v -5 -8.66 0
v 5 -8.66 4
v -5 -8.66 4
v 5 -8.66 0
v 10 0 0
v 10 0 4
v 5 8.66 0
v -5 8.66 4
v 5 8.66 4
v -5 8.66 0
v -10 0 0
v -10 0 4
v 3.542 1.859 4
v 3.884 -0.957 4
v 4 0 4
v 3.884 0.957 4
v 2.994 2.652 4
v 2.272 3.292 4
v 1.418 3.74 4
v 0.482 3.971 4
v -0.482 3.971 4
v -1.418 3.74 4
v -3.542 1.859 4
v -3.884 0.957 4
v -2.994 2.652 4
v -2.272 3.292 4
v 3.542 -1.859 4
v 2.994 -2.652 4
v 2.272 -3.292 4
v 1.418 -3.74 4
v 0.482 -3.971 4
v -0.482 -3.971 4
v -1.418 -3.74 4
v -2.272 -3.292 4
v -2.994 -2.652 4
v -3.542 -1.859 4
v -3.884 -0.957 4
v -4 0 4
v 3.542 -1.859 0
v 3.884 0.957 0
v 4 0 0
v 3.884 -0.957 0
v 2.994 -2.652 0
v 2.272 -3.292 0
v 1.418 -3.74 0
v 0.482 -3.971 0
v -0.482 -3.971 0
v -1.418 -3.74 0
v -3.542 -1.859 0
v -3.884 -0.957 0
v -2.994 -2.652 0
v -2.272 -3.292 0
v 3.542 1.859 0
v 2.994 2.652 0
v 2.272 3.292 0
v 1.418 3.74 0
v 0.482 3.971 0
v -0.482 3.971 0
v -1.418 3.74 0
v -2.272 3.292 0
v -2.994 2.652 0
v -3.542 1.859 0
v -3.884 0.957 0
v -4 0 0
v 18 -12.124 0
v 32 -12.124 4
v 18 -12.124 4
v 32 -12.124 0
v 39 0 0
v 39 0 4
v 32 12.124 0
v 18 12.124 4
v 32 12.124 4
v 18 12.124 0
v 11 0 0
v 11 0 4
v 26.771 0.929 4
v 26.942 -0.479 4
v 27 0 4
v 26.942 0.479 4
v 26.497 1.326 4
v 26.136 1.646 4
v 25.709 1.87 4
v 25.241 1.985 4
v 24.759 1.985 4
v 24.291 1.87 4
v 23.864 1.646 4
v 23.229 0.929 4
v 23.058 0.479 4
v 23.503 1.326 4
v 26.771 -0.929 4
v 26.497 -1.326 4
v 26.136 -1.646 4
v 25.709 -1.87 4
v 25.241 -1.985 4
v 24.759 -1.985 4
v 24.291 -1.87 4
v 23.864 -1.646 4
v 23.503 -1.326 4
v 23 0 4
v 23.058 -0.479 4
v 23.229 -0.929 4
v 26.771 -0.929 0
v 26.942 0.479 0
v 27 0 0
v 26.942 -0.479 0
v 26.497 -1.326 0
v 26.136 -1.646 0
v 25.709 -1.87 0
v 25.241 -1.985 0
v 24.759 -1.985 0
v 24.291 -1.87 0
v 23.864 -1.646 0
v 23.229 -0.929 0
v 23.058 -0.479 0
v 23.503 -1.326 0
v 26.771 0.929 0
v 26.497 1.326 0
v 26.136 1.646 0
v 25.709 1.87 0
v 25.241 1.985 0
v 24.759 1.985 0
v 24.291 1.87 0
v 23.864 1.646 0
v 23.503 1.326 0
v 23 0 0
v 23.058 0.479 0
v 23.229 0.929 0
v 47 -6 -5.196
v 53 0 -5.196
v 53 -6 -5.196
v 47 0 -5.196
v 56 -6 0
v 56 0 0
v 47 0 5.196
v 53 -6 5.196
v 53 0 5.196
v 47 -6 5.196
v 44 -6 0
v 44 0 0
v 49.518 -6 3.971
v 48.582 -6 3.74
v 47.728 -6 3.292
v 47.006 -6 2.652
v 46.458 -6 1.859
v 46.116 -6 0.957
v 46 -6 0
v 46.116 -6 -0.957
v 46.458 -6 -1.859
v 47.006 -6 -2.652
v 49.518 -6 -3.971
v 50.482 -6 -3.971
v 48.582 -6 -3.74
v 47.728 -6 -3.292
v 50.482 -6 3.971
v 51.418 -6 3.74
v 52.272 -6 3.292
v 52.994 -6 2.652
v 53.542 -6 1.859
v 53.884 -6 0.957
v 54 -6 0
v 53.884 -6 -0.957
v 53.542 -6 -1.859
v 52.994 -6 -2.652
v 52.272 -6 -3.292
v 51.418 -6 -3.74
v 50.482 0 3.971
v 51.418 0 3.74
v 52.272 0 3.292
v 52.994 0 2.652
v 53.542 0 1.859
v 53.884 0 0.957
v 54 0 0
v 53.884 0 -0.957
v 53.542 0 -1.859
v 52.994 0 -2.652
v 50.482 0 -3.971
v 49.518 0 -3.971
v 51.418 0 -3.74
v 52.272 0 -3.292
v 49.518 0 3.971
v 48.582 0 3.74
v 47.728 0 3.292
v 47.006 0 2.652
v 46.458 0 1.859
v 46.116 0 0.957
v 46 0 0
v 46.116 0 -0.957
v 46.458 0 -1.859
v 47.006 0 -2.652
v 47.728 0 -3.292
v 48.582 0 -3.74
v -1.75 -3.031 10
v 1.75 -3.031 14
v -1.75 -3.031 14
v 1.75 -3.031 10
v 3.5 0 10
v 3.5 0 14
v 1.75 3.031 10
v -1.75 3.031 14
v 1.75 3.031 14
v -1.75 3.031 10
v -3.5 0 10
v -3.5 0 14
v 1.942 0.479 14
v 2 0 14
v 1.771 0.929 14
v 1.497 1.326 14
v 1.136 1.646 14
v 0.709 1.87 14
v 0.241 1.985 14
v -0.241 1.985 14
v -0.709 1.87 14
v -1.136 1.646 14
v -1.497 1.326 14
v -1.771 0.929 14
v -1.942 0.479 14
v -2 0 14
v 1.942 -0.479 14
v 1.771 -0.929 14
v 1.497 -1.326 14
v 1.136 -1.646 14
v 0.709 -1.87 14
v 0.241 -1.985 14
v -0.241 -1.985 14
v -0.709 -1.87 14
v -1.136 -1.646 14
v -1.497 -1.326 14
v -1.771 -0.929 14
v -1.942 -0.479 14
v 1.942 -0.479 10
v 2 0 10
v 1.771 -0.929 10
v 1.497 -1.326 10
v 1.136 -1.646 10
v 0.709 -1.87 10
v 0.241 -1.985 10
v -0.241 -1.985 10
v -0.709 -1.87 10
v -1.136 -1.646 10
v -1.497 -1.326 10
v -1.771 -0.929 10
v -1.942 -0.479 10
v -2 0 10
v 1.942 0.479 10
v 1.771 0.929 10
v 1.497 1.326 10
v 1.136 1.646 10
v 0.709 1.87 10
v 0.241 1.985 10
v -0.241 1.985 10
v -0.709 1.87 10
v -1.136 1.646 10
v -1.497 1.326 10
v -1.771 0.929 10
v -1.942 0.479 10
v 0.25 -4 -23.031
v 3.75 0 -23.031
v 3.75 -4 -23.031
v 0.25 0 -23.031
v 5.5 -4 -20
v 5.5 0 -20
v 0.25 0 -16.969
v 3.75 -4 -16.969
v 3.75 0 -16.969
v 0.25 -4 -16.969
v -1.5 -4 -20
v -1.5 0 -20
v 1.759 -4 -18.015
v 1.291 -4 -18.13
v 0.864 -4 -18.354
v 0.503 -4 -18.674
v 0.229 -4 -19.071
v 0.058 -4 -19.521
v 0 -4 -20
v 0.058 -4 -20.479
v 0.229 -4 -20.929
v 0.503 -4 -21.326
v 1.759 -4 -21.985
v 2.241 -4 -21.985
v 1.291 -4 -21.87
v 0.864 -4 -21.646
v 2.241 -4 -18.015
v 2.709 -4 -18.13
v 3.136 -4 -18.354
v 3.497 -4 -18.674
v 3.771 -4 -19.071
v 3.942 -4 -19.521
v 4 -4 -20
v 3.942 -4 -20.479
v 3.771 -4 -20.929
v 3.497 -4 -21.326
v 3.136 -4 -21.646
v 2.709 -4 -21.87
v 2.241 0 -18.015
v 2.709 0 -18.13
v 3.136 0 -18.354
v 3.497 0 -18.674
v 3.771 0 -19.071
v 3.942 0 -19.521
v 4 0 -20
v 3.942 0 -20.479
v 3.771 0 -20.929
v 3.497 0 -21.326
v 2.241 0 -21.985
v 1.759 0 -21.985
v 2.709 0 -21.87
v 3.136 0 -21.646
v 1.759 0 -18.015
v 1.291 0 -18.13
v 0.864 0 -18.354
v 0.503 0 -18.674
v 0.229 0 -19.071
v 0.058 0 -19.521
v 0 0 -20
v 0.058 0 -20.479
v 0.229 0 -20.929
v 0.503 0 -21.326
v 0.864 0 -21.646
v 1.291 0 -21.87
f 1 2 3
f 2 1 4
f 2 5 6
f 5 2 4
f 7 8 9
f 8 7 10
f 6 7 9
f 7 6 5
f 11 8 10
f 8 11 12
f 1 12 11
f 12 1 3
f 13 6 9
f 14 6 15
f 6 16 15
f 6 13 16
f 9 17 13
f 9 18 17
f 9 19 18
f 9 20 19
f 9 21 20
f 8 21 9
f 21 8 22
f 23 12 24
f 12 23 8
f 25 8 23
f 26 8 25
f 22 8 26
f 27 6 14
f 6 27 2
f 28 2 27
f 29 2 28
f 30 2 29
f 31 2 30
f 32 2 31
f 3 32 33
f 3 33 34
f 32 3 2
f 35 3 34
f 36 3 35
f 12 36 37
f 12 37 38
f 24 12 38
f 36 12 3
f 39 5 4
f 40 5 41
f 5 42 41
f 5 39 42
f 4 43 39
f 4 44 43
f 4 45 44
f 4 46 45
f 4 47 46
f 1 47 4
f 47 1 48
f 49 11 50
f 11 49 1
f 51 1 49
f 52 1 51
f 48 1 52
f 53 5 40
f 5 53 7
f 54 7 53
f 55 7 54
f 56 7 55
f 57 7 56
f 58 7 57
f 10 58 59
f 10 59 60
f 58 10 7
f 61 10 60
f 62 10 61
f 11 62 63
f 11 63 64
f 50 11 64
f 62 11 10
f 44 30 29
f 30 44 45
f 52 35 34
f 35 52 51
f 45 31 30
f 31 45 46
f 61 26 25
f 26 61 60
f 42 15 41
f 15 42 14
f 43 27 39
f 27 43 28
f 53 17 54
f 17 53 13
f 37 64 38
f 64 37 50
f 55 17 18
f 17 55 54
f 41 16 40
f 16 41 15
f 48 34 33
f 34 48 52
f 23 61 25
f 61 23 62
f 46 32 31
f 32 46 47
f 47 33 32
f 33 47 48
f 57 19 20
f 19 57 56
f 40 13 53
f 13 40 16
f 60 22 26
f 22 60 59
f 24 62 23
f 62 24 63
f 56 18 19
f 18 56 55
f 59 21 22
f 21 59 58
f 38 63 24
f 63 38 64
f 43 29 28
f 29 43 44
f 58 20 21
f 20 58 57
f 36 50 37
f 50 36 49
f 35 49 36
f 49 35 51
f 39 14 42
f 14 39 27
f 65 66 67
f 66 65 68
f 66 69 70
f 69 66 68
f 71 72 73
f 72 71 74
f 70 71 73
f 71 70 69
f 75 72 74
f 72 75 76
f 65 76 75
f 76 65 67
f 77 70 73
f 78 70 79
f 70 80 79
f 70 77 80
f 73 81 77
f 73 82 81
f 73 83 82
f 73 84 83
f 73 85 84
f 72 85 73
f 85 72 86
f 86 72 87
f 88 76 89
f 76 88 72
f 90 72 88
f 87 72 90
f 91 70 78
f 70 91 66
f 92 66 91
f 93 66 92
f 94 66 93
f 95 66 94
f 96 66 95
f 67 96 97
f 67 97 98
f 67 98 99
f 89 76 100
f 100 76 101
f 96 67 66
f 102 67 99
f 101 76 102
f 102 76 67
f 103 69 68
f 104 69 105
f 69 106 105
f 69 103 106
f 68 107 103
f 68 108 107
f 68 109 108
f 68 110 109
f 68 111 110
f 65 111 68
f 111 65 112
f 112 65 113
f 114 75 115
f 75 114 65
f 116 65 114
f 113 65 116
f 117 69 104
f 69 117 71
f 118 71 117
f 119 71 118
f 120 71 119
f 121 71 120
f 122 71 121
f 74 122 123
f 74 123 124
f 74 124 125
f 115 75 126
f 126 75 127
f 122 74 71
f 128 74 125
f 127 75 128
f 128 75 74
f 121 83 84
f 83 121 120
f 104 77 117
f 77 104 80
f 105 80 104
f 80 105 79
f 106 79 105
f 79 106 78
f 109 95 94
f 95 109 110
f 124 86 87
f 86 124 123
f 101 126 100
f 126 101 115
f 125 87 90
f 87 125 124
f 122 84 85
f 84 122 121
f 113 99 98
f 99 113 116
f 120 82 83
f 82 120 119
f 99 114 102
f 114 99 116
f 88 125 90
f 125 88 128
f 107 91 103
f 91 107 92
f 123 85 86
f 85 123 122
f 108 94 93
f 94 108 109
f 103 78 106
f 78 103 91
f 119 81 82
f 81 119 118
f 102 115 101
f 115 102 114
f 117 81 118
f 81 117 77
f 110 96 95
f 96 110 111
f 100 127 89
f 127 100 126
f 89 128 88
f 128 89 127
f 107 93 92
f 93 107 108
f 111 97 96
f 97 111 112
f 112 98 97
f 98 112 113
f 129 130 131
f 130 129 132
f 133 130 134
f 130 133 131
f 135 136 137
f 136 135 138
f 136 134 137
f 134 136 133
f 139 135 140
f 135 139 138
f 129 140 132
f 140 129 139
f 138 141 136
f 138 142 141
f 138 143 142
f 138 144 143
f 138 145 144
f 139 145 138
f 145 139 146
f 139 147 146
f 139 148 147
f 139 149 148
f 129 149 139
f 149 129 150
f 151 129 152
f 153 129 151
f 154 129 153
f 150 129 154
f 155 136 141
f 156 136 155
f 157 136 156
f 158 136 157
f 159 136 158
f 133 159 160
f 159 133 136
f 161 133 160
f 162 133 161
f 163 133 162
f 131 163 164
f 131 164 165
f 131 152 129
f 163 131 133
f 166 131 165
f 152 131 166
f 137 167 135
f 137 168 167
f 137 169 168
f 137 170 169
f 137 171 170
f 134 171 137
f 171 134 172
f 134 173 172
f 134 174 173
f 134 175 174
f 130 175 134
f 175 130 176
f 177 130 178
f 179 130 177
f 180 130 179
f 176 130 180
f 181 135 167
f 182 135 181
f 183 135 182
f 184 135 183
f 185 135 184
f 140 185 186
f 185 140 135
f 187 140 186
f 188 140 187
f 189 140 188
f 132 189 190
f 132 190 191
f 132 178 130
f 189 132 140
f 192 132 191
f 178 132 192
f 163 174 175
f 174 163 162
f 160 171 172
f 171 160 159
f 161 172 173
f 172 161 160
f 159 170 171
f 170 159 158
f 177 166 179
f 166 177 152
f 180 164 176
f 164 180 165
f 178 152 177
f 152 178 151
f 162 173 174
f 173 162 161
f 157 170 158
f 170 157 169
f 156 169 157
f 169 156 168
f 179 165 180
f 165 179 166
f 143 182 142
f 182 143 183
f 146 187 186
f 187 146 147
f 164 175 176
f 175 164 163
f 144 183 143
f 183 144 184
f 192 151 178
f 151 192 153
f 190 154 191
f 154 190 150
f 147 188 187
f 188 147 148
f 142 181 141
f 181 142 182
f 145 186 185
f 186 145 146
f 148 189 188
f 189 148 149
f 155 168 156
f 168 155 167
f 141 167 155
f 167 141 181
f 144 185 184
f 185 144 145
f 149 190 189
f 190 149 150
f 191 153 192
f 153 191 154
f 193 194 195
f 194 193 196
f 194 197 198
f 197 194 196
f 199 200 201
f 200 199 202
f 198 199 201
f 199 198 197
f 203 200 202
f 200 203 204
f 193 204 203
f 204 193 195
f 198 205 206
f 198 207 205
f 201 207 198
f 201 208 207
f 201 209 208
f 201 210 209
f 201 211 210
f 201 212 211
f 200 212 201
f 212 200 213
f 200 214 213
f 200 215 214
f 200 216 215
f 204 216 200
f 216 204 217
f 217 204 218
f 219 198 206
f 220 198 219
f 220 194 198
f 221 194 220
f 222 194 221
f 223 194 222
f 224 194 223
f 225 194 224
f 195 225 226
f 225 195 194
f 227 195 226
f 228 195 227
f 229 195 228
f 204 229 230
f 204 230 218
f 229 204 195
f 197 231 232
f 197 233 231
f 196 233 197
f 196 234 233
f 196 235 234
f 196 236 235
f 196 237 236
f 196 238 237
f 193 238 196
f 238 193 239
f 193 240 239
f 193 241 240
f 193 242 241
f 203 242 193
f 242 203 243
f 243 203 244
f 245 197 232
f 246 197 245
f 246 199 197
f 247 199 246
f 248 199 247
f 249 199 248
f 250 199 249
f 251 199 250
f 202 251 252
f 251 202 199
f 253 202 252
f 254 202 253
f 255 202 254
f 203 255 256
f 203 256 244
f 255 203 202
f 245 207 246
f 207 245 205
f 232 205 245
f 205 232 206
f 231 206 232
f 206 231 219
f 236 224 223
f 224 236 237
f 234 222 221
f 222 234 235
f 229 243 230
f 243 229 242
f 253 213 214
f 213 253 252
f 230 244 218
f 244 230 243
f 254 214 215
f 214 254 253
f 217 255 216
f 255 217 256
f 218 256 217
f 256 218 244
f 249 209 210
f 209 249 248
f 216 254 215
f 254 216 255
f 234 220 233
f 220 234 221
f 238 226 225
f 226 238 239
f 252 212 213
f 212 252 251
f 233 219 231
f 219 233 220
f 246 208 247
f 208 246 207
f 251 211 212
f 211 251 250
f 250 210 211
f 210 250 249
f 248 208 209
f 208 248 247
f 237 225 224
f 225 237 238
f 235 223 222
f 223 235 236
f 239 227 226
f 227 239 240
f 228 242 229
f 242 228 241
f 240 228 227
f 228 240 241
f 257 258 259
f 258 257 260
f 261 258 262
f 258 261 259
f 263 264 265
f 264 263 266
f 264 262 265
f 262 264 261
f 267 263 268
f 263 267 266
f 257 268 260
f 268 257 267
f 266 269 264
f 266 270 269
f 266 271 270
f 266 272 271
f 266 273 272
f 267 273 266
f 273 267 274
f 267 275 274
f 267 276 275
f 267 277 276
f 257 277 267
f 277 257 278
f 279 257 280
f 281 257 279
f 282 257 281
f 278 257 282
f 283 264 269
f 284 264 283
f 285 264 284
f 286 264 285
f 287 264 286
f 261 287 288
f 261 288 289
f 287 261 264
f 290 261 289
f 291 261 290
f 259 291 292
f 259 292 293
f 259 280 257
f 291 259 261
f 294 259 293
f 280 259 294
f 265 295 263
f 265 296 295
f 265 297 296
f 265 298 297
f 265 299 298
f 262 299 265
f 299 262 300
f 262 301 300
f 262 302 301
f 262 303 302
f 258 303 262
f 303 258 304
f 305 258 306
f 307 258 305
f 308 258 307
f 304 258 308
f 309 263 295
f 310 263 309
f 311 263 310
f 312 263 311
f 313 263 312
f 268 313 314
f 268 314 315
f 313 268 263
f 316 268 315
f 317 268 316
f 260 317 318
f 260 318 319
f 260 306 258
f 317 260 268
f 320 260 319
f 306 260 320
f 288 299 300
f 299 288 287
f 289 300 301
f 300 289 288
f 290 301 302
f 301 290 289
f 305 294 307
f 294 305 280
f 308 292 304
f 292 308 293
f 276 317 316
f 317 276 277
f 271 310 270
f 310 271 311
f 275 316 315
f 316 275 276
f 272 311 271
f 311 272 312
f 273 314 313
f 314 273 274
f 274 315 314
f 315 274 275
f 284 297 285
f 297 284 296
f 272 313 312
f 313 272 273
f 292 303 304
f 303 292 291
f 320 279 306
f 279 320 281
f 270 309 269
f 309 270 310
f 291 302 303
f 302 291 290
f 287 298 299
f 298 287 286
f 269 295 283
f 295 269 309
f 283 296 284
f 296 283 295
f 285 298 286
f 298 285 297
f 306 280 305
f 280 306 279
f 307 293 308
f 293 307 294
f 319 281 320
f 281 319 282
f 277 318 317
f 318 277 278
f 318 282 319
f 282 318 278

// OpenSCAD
module piulita(raza_exterior, raza_interior, grosime)
{
    difference(){
        cylinder(h = grosime, r = raza_exterior, $fn = 6);
    
        translate ([0, 0, -1]) cylinder(h = grosime + 2, r = raza_interior, $fn = 26);
    }
}

module piulita_M4()
{
    piulita(3.5, 2, 4);
}
color ("red") piulita(10, 4, 4);
color ("yellow") translate ([25, 0, 0]) piulita(14, 2, 4);

color("blue") translate ([50, 0, 0]) rotate([90, 0, 0]) piulita(6, 4, 6);
translate([0, 0, 10]) piulita_M4();
translate([2, 0, -20]) rotate([90,0,0]) piulita_M4();
